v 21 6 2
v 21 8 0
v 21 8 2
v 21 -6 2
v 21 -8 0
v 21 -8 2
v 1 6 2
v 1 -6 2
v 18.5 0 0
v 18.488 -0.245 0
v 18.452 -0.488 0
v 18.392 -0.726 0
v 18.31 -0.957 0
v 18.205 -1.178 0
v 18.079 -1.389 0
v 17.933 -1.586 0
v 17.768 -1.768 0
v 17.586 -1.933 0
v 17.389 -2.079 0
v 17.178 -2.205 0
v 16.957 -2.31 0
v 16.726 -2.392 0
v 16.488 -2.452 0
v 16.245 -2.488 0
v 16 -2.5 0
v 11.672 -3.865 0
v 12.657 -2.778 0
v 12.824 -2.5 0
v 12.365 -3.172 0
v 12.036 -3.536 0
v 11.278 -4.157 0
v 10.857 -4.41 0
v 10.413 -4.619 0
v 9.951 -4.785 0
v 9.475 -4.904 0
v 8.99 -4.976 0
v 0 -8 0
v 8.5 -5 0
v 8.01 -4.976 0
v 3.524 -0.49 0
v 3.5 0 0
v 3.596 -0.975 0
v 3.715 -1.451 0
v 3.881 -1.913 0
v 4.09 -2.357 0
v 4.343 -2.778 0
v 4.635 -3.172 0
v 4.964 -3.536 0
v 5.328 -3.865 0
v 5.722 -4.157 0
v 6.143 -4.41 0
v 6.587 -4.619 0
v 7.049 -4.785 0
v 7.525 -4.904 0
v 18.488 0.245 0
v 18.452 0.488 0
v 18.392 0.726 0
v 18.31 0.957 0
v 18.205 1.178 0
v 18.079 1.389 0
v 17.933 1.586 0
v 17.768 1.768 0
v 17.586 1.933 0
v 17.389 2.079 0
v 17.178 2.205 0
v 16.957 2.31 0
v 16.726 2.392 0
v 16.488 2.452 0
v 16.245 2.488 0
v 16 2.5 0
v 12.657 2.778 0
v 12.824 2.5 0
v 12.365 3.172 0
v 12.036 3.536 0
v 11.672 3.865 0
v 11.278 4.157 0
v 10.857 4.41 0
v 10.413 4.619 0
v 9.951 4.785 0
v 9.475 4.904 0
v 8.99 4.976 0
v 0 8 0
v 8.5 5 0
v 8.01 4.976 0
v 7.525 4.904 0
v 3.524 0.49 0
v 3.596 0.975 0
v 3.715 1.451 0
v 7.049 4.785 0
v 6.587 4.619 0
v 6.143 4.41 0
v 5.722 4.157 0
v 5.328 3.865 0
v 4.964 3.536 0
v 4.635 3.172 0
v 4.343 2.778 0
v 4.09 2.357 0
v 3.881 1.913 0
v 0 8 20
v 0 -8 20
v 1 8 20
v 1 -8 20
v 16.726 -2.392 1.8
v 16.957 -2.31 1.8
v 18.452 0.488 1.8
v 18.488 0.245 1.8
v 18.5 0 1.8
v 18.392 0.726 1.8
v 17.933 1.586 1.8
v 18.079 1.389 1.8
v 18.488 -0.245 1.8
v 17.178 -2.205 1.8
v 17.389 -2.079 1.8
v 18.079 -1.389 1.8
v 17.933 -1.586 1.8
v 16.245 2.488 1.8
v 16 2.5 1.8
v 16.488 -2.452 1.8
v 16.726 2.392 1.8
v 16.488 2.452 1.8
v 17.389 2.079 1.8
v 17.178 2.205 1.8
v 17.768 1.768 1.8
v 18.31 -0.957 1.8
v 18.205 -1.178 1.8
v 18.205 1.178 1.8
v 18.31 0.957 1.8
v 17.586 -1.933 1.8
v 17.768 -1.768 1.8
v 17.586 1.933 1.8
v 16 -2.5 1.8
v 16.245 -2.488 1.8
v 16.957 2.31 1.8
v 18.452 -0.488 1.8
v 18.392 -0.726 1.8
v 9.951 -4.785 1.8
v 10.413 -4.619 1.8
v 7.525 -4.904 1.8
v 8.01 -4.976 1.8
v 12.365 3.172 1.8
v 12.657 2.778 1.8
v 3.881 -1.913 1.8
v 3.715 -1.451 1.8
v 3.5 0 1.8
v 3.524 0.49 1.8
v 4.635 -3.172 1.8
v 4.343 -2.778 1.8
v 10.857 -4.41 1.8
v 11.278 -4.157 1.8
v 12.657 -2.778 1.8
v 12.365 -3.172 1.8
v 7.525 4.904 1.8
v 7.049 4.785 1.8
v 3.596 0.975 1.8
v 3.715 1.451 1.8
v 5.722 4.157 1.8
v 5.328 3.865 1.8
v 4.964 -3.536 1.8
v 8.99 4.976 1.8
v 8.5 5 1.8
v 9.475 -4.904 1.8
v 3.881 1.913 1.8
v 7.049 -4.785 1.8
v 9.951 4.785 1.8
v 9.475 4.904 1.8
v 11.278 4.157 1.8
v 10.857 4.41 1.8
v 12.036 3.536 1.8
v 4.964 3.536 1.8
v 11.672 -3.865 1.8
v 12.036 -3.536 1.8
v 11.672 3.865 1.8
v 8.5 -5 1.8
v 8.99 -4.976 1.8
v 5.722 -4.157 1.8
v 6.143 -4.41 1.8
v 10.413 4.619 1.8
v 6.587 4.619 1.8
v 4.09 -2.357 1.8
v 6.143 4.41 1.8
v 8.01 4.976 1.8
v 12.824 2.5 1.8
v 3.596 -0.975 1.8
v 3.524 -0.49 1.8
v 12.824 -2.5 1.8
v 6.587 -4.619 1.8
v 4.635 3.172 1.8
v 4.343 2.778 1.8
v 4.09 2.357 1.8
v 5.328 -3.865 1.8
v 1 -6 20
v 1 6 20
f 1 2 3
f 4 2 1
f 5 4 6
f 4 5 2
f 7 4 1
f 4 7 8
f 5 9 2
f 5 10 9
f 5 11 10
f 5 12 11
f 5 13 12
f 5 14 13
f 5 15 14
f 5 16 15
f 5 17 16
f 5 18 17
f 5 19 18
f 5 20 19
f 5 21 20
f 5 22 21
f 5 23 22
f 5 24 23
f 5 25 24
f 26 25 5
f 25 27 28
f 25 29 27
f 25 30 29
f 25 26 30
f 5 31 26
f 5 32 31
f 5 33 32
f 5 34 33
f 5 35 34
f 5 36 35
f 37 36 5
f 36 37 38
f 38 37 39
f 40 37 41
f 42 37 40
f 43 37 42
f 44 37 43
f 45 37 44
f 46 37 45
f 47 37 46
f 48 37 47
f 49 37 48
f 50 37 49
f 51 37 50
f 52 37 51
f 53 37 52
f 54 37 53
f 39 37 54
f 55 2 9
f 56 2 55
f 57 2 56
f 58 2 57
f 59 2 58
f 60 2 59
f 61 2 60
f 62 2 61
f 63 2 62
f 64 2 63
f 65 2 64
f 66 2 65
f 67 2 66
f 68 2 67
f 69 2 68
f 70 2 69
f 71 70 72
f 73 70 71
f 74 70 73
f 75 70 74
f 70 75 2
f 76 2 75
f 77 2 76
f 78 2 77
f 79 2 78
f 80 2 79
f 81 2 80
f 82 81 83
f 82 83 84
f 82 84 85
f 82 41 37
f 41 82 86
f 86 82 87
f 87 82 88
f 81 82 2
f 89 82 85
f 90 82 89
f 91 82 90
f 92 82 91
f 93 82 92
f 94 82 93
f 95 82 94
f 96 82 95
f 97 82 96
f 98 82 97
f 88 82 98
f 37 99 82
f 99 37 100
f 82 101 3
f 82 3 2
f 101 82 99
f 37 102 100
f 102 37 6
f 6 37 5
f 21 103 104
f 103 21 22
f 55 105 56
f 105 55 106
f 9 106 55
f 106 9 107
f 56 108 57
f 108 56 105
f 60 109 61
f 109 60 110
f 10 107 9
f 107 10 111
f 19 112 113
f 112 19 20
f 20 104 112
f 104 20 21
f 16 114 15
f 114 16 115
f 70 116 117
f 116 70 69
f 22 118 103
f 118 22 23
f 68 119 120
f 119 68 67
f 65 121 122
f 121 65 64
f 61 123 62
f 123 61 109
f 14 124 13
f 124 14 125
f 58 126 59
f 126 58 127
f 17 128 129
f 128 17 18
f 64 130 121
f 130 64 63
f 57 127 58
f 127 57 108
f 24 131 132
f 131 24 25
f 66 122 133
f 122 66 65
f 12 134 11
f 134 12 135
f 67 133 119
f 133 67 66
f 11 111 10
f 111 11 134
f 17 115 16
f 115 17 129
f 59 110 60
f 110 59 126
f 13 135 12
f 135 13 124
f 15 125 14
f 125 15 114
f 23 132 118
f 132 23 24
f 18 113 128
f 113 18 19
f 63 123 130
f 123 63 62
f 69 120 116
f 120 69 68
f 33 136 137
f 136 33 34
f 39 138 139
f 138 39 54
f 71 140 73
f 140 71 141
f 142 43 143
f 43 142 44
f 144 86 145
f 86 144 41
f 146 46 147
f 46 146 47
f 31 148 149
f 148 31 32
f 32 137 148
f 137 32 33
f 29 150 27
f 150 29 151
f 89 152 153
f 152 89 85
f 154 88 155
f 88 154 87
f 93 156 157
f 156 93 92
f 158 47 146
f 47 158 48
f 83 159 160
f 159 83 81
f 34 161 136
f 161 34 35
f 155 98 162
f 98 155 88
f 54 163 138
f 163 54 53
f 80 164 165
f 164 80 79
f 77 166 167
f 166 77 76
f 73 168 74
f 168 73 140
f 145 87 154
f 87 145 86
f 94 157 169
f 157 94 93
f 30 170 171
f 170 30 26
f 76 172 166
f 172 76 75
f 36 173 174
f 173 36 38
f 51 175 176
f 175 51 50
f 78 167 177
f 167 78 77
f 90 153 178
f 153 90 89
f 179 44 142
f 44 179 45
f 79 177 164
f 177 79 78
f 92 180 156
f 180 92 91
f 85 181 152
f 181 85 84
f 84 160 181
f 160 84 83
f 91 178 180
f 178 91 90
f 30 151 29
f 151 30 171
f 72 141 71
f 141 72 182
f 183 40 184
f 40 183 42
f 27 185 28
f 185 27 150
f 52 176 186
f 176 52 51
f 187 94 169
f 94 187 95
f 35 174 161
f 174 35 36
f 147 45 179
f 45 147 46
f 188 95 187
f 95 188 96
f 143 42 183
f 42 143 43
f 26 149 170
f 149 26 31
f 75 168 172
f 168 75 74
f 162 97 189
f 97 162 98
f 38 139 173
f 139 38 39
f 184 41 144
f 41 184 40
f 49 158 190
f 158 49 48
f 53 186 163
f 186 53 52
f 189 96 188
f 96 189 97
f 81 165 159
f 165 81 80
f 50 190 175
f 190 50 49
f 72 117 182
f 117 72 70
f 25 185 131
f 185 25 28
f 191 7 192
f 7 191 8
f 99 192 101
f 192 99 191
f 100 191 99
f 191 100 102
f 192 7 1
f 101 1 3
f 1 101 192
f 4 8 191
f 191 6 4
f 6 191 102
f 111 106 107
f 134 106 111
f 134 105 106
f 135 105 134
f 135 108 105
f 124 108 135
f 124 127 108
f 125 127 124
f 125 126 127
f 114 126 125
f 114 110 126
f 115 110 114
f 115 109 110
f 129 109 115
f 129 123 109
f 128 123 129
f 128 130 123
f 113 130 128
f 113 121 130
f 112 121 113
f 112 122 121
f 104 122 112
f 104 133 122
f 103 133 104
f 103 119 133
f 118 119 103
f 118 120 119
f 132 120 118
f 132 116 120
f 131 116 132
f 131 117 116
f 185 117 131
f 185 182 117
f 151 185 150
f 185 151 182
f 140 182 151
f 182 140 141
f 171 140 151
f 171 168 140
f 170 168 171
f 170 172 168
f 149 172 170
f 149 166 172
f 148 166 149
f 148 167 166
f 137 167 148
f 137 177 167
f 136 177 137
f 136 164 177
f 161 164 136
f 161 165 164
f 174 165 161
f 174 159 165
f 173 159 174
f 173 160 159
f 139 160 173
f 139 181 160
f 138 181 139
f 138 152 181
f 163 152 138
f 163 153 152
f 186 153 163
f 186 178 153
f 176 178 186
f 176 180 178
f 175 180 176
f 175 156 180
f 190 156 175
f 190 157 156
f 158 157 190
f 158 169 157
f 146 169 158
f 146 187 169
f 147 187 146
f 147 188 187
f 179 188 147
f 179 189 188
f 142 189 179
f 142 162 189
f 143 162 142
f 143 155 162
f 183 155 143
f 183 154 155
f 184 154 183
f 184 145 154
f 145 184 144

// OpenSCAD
// file: ../mscrew/knurlpocket.scad
//Module to create a knurl pocket suitable for Heat-set inserts

// Articles about knurl insert
//https://hackaday.com/2019/02/28/threading-3d-printed-parts-how-to-use-heat-set-inserts/
//https://clevercreations.org/brass-threaded-inserts-plastic-3d-printing/

//Global vars
$fa = 1;
$fs = 0.2;
function knurl_radius(M=5) = 
    (M==5) ? 3.3 : 
    (M==4) ? 2.8 : 
    (M==3) ? 2.5 : 
    (M==2) ? 1.5 : 
    0;
function knurl_wall(M=5) = 
    (M==5) ? 3.5 : 
    (M==4) ? 3.0 : 
    (M==3) ? 2.5 :
    (M==2) ? 2.5 :
    0;


module Mknurl_ring(knurl_depth = 5, Msize=5)
{

    difference() {   
        cylinder(h=knurl_depth, r=knurl_radius(Msize)+knurl_wall(Msize),center=true);
        Mknurl_pocket(knurl_depth, Msize);
    }
    
}

module Mknurl_pocket(knurl_depth = 5,Msize=5)
{
 union() {
    cylinder(h=knurl_depth+0.001, r=knurl_radius(Msize), center=true);
    translate([0,0,0.4*knurl_depth])
        cylinder(h=0.25 * knurl_depth, r1=knurl_radius(Msize), r2=1.2*knurl_radius(Msize), center=true);
 }
}

Mknurl_ring(5,4);
// file: outlet.scad
thickness=1;

function ringHeight() = 30;
function outerD() = 54.8;
function outletD()= outerD()-2*thickness;

module budOutlet()
{

    notchX=6;
    notchY=1;
    notchz=1.6;
    notchOffset=ringHeight()/2-5;
    
    
    difference()
    {
        cylinder(h=ringHeight(),d=outerD(),center=true, $fn=128);
        cylinder(h=ringHeight(),d=outletD(),center=true, $fn=128);       
    }
    translate([0,outerD()/2-thickness/2,notchOffset])cube([notchX,thickness,notchz],center=true);
    translate([0,outerD()/2+notchY/2,notchOffset])cube([notchX,notchY,notchz],center=true);

    translate([0,-outerD()/2+thickness/2,notchOffset])cube([notchX,thickness,notchz],center=true);
    translate([0,-outerD()/2-notchY/2,notchOffset])cube([notchX,notchY,notchz],center=true);
}



module louveredOutlet()
{
    tabringD=54.5;
    tabThick=1;
    tubeD = 51;
    tubeHeight = ringHeight();
    innerD = tubeD-2*thickness;
    narrowHeight=5;
    difference()
    {
        union()
        {
            // tab ring
            translate([0,0,-tubeHeight/2+tabThick/2])cylinder(h=tabThick,d=tabringD,center=true, $fn=128);
            //match standard ring, not needed but nice
            translate([0,0,(tubeHeight-narrowHeight)/2])cylinder(h=tubeHeight-narrowHeight,d=outerD(),center=true,$fn=128);
            // The main tube
            cylinder(h=tubeHeight,d=tubeD,center=true, $fn=128);
        }
        cylinder(h=tubeHeight,d=innerD,center=true, $fn=128);
        translate([0,0,-tubeHeight/2+tabThick/2])cube([tabringD,20,tabThick],center=true);
    }
}


module outlet(style="bud")
{
    if (style=="bud")
        budOutlet();
    else
        louveredOutlet();
}

outlet();
// file: controller.scad
use <outlet.scad>
use <../mscrew/knurlpocket.scad>

function wallThickness()=1;
function controllerHeight()=27;
function oozeMargin()=0.2;
function tabCut()=15;
function controllerWidth()=70;

thickness=wallThickness();
height=controllerHeight();
oozeMargin=oozeMargin();
tabWidth=tabCut();
 
module right_angle_prism(l, w, h) {
    linear_extrude(height = h) {
        polygon(points=[[0,0],[l,0],[0,w]], paths=[[0,1,2]]);
    }
}


module controller(
    depth=65
)
{
    width=controllerWidth()+2*(thickness+oozeMargin);
    
    tabThick=3;
    lip=5;
    
    difference() 
    {
        //Outside cube
        cube([depth,width,height],center=true);

        //inside space
        translate([-thickness,0,thickness])cube([depth,width-2*thickness,height],center=true);
        //notch for tab
        translate([-depth/2+tabWidth/2,-width/2,0])cube([tabWidth,tabThick,height+lip*2],center=true);

        inX=depth/2;
        inZ=height;
        
        // Outlet hole
        translate([inX/2-2*thickness,-width/2,-height/2+inZ/2+thickness])cube([inX,width,inZ],center=true);
        translate([-2*thickness,-width/2,-height/2+inZ/2+thickness])rotate([0,45,0])cube([inZ*sqrt(2)/2,width,inZ*sqrt(2)/2],center=true);
        
    }

    knurlDepth=10;
    
    difference() {
    // Hacks to provide space for the tab
        union() {
            translate([-depth/2,width/2,-height/2])rotate([90,0,0])right_angle_prism(height,height, width-tabThick);
            translate([-depth/2+tabWidth/2+thickness,-width/2+tabThick+thickness/2,0])cube([tabWidth+2*    thickness,thickness,height],center=true);
            translate([-depth/2+tabWidth+tabThick/2,-width/2+tabThick/2,0])cube([tabThick,tabThick,height],center=true);
        }
        
    // knurl hole   
    translate([-depth/2+6.5,-width/2+knurlDepth/2+tabThick,height/2-15])rotate([90,0,0])Mknurl_pocket(knurlDepth,4);
   
    //Space for screws in back
    translate([-depth/2,width/2-10,0])cube([5,15,20],center=true);
    translate([-depth/2,12-width/2,0])cube([5,15,20],center=true);
  
        
    }

    //lips
    translate([tabWidth/2,-width/2+thickness/2,height/2+lip/2])cube([depth-tabWidth,thickness+0.01,lip],center=true);
    translate([0,width/2-thickness/2,height/2+lip/2])cube([depth,thickness,lip],center=true);
    
    
}

difference()
{
controller(80);
    //translate([0,30,0])cube([100,100,100],center=true);
    //translate([15,0,0])cube([100,100,100],center=true);
    //translate([34,0,50])cube([100,100,100],center=true);
    //translate([-20,0,0])cube([100,100,100],center=true);
}
// main file
use <controller.scad>

function screwTabWidth()=16; 
function screwTabThick()=2; 
 
module right_angle_prism(l, w, h) {
    linear_extrude(height = h) {
        polygon(points=[[0,0],[l,0],[0,w]], paths=[[0,1,2]]);
    }
}

module screwtab(tabHeight=20)
{
    tabX=21;
    tabY=screwTabWidth();
    tabThick=screwTabThick();
    screwD=5;
    screwHeadD=10;

    difference()
    {
        translate([tabX/2,0,tabThick/2])cube([tabX,tabY,tabThick],center=true);
        translate([tabX-screwD,0,0])cylinder(d=screwD,h=4*tabThick,center=true, $fn=64);
        translate([tabX-1.5*screwD-screwHeadD/2,0,0])cylinder(d=screwHeadD,h=4*tabThick,center=true, $fn=64);
        translate([tabX-1.5*screwD,0,0])cube([screwD,screwD,4*tabThick],center=true);
    }
    
    //backwall
    translate([wallThickness()/2,0,tabHeight/2])cube([wallThickness(),tabY,tabHeight],center=true);
    
    translate([wallThickness(),tabY/2,tabThick])rotate([90,0,0])right_angle_prism(tabX-wallThickness(),tabHeight-tabThick,tabThick);
    translate([wallThickness(),-tabY/2+tabThick,tabThick])rotate([90,0,0])right_angle_prism(tabX-wallThickness(),tabHeight-tabThick,tabThick);

    translate([tabX/2,0,tabThick-0.1])cube([tabX,tabY,0.2],center=true);
    
}

screwtab();
